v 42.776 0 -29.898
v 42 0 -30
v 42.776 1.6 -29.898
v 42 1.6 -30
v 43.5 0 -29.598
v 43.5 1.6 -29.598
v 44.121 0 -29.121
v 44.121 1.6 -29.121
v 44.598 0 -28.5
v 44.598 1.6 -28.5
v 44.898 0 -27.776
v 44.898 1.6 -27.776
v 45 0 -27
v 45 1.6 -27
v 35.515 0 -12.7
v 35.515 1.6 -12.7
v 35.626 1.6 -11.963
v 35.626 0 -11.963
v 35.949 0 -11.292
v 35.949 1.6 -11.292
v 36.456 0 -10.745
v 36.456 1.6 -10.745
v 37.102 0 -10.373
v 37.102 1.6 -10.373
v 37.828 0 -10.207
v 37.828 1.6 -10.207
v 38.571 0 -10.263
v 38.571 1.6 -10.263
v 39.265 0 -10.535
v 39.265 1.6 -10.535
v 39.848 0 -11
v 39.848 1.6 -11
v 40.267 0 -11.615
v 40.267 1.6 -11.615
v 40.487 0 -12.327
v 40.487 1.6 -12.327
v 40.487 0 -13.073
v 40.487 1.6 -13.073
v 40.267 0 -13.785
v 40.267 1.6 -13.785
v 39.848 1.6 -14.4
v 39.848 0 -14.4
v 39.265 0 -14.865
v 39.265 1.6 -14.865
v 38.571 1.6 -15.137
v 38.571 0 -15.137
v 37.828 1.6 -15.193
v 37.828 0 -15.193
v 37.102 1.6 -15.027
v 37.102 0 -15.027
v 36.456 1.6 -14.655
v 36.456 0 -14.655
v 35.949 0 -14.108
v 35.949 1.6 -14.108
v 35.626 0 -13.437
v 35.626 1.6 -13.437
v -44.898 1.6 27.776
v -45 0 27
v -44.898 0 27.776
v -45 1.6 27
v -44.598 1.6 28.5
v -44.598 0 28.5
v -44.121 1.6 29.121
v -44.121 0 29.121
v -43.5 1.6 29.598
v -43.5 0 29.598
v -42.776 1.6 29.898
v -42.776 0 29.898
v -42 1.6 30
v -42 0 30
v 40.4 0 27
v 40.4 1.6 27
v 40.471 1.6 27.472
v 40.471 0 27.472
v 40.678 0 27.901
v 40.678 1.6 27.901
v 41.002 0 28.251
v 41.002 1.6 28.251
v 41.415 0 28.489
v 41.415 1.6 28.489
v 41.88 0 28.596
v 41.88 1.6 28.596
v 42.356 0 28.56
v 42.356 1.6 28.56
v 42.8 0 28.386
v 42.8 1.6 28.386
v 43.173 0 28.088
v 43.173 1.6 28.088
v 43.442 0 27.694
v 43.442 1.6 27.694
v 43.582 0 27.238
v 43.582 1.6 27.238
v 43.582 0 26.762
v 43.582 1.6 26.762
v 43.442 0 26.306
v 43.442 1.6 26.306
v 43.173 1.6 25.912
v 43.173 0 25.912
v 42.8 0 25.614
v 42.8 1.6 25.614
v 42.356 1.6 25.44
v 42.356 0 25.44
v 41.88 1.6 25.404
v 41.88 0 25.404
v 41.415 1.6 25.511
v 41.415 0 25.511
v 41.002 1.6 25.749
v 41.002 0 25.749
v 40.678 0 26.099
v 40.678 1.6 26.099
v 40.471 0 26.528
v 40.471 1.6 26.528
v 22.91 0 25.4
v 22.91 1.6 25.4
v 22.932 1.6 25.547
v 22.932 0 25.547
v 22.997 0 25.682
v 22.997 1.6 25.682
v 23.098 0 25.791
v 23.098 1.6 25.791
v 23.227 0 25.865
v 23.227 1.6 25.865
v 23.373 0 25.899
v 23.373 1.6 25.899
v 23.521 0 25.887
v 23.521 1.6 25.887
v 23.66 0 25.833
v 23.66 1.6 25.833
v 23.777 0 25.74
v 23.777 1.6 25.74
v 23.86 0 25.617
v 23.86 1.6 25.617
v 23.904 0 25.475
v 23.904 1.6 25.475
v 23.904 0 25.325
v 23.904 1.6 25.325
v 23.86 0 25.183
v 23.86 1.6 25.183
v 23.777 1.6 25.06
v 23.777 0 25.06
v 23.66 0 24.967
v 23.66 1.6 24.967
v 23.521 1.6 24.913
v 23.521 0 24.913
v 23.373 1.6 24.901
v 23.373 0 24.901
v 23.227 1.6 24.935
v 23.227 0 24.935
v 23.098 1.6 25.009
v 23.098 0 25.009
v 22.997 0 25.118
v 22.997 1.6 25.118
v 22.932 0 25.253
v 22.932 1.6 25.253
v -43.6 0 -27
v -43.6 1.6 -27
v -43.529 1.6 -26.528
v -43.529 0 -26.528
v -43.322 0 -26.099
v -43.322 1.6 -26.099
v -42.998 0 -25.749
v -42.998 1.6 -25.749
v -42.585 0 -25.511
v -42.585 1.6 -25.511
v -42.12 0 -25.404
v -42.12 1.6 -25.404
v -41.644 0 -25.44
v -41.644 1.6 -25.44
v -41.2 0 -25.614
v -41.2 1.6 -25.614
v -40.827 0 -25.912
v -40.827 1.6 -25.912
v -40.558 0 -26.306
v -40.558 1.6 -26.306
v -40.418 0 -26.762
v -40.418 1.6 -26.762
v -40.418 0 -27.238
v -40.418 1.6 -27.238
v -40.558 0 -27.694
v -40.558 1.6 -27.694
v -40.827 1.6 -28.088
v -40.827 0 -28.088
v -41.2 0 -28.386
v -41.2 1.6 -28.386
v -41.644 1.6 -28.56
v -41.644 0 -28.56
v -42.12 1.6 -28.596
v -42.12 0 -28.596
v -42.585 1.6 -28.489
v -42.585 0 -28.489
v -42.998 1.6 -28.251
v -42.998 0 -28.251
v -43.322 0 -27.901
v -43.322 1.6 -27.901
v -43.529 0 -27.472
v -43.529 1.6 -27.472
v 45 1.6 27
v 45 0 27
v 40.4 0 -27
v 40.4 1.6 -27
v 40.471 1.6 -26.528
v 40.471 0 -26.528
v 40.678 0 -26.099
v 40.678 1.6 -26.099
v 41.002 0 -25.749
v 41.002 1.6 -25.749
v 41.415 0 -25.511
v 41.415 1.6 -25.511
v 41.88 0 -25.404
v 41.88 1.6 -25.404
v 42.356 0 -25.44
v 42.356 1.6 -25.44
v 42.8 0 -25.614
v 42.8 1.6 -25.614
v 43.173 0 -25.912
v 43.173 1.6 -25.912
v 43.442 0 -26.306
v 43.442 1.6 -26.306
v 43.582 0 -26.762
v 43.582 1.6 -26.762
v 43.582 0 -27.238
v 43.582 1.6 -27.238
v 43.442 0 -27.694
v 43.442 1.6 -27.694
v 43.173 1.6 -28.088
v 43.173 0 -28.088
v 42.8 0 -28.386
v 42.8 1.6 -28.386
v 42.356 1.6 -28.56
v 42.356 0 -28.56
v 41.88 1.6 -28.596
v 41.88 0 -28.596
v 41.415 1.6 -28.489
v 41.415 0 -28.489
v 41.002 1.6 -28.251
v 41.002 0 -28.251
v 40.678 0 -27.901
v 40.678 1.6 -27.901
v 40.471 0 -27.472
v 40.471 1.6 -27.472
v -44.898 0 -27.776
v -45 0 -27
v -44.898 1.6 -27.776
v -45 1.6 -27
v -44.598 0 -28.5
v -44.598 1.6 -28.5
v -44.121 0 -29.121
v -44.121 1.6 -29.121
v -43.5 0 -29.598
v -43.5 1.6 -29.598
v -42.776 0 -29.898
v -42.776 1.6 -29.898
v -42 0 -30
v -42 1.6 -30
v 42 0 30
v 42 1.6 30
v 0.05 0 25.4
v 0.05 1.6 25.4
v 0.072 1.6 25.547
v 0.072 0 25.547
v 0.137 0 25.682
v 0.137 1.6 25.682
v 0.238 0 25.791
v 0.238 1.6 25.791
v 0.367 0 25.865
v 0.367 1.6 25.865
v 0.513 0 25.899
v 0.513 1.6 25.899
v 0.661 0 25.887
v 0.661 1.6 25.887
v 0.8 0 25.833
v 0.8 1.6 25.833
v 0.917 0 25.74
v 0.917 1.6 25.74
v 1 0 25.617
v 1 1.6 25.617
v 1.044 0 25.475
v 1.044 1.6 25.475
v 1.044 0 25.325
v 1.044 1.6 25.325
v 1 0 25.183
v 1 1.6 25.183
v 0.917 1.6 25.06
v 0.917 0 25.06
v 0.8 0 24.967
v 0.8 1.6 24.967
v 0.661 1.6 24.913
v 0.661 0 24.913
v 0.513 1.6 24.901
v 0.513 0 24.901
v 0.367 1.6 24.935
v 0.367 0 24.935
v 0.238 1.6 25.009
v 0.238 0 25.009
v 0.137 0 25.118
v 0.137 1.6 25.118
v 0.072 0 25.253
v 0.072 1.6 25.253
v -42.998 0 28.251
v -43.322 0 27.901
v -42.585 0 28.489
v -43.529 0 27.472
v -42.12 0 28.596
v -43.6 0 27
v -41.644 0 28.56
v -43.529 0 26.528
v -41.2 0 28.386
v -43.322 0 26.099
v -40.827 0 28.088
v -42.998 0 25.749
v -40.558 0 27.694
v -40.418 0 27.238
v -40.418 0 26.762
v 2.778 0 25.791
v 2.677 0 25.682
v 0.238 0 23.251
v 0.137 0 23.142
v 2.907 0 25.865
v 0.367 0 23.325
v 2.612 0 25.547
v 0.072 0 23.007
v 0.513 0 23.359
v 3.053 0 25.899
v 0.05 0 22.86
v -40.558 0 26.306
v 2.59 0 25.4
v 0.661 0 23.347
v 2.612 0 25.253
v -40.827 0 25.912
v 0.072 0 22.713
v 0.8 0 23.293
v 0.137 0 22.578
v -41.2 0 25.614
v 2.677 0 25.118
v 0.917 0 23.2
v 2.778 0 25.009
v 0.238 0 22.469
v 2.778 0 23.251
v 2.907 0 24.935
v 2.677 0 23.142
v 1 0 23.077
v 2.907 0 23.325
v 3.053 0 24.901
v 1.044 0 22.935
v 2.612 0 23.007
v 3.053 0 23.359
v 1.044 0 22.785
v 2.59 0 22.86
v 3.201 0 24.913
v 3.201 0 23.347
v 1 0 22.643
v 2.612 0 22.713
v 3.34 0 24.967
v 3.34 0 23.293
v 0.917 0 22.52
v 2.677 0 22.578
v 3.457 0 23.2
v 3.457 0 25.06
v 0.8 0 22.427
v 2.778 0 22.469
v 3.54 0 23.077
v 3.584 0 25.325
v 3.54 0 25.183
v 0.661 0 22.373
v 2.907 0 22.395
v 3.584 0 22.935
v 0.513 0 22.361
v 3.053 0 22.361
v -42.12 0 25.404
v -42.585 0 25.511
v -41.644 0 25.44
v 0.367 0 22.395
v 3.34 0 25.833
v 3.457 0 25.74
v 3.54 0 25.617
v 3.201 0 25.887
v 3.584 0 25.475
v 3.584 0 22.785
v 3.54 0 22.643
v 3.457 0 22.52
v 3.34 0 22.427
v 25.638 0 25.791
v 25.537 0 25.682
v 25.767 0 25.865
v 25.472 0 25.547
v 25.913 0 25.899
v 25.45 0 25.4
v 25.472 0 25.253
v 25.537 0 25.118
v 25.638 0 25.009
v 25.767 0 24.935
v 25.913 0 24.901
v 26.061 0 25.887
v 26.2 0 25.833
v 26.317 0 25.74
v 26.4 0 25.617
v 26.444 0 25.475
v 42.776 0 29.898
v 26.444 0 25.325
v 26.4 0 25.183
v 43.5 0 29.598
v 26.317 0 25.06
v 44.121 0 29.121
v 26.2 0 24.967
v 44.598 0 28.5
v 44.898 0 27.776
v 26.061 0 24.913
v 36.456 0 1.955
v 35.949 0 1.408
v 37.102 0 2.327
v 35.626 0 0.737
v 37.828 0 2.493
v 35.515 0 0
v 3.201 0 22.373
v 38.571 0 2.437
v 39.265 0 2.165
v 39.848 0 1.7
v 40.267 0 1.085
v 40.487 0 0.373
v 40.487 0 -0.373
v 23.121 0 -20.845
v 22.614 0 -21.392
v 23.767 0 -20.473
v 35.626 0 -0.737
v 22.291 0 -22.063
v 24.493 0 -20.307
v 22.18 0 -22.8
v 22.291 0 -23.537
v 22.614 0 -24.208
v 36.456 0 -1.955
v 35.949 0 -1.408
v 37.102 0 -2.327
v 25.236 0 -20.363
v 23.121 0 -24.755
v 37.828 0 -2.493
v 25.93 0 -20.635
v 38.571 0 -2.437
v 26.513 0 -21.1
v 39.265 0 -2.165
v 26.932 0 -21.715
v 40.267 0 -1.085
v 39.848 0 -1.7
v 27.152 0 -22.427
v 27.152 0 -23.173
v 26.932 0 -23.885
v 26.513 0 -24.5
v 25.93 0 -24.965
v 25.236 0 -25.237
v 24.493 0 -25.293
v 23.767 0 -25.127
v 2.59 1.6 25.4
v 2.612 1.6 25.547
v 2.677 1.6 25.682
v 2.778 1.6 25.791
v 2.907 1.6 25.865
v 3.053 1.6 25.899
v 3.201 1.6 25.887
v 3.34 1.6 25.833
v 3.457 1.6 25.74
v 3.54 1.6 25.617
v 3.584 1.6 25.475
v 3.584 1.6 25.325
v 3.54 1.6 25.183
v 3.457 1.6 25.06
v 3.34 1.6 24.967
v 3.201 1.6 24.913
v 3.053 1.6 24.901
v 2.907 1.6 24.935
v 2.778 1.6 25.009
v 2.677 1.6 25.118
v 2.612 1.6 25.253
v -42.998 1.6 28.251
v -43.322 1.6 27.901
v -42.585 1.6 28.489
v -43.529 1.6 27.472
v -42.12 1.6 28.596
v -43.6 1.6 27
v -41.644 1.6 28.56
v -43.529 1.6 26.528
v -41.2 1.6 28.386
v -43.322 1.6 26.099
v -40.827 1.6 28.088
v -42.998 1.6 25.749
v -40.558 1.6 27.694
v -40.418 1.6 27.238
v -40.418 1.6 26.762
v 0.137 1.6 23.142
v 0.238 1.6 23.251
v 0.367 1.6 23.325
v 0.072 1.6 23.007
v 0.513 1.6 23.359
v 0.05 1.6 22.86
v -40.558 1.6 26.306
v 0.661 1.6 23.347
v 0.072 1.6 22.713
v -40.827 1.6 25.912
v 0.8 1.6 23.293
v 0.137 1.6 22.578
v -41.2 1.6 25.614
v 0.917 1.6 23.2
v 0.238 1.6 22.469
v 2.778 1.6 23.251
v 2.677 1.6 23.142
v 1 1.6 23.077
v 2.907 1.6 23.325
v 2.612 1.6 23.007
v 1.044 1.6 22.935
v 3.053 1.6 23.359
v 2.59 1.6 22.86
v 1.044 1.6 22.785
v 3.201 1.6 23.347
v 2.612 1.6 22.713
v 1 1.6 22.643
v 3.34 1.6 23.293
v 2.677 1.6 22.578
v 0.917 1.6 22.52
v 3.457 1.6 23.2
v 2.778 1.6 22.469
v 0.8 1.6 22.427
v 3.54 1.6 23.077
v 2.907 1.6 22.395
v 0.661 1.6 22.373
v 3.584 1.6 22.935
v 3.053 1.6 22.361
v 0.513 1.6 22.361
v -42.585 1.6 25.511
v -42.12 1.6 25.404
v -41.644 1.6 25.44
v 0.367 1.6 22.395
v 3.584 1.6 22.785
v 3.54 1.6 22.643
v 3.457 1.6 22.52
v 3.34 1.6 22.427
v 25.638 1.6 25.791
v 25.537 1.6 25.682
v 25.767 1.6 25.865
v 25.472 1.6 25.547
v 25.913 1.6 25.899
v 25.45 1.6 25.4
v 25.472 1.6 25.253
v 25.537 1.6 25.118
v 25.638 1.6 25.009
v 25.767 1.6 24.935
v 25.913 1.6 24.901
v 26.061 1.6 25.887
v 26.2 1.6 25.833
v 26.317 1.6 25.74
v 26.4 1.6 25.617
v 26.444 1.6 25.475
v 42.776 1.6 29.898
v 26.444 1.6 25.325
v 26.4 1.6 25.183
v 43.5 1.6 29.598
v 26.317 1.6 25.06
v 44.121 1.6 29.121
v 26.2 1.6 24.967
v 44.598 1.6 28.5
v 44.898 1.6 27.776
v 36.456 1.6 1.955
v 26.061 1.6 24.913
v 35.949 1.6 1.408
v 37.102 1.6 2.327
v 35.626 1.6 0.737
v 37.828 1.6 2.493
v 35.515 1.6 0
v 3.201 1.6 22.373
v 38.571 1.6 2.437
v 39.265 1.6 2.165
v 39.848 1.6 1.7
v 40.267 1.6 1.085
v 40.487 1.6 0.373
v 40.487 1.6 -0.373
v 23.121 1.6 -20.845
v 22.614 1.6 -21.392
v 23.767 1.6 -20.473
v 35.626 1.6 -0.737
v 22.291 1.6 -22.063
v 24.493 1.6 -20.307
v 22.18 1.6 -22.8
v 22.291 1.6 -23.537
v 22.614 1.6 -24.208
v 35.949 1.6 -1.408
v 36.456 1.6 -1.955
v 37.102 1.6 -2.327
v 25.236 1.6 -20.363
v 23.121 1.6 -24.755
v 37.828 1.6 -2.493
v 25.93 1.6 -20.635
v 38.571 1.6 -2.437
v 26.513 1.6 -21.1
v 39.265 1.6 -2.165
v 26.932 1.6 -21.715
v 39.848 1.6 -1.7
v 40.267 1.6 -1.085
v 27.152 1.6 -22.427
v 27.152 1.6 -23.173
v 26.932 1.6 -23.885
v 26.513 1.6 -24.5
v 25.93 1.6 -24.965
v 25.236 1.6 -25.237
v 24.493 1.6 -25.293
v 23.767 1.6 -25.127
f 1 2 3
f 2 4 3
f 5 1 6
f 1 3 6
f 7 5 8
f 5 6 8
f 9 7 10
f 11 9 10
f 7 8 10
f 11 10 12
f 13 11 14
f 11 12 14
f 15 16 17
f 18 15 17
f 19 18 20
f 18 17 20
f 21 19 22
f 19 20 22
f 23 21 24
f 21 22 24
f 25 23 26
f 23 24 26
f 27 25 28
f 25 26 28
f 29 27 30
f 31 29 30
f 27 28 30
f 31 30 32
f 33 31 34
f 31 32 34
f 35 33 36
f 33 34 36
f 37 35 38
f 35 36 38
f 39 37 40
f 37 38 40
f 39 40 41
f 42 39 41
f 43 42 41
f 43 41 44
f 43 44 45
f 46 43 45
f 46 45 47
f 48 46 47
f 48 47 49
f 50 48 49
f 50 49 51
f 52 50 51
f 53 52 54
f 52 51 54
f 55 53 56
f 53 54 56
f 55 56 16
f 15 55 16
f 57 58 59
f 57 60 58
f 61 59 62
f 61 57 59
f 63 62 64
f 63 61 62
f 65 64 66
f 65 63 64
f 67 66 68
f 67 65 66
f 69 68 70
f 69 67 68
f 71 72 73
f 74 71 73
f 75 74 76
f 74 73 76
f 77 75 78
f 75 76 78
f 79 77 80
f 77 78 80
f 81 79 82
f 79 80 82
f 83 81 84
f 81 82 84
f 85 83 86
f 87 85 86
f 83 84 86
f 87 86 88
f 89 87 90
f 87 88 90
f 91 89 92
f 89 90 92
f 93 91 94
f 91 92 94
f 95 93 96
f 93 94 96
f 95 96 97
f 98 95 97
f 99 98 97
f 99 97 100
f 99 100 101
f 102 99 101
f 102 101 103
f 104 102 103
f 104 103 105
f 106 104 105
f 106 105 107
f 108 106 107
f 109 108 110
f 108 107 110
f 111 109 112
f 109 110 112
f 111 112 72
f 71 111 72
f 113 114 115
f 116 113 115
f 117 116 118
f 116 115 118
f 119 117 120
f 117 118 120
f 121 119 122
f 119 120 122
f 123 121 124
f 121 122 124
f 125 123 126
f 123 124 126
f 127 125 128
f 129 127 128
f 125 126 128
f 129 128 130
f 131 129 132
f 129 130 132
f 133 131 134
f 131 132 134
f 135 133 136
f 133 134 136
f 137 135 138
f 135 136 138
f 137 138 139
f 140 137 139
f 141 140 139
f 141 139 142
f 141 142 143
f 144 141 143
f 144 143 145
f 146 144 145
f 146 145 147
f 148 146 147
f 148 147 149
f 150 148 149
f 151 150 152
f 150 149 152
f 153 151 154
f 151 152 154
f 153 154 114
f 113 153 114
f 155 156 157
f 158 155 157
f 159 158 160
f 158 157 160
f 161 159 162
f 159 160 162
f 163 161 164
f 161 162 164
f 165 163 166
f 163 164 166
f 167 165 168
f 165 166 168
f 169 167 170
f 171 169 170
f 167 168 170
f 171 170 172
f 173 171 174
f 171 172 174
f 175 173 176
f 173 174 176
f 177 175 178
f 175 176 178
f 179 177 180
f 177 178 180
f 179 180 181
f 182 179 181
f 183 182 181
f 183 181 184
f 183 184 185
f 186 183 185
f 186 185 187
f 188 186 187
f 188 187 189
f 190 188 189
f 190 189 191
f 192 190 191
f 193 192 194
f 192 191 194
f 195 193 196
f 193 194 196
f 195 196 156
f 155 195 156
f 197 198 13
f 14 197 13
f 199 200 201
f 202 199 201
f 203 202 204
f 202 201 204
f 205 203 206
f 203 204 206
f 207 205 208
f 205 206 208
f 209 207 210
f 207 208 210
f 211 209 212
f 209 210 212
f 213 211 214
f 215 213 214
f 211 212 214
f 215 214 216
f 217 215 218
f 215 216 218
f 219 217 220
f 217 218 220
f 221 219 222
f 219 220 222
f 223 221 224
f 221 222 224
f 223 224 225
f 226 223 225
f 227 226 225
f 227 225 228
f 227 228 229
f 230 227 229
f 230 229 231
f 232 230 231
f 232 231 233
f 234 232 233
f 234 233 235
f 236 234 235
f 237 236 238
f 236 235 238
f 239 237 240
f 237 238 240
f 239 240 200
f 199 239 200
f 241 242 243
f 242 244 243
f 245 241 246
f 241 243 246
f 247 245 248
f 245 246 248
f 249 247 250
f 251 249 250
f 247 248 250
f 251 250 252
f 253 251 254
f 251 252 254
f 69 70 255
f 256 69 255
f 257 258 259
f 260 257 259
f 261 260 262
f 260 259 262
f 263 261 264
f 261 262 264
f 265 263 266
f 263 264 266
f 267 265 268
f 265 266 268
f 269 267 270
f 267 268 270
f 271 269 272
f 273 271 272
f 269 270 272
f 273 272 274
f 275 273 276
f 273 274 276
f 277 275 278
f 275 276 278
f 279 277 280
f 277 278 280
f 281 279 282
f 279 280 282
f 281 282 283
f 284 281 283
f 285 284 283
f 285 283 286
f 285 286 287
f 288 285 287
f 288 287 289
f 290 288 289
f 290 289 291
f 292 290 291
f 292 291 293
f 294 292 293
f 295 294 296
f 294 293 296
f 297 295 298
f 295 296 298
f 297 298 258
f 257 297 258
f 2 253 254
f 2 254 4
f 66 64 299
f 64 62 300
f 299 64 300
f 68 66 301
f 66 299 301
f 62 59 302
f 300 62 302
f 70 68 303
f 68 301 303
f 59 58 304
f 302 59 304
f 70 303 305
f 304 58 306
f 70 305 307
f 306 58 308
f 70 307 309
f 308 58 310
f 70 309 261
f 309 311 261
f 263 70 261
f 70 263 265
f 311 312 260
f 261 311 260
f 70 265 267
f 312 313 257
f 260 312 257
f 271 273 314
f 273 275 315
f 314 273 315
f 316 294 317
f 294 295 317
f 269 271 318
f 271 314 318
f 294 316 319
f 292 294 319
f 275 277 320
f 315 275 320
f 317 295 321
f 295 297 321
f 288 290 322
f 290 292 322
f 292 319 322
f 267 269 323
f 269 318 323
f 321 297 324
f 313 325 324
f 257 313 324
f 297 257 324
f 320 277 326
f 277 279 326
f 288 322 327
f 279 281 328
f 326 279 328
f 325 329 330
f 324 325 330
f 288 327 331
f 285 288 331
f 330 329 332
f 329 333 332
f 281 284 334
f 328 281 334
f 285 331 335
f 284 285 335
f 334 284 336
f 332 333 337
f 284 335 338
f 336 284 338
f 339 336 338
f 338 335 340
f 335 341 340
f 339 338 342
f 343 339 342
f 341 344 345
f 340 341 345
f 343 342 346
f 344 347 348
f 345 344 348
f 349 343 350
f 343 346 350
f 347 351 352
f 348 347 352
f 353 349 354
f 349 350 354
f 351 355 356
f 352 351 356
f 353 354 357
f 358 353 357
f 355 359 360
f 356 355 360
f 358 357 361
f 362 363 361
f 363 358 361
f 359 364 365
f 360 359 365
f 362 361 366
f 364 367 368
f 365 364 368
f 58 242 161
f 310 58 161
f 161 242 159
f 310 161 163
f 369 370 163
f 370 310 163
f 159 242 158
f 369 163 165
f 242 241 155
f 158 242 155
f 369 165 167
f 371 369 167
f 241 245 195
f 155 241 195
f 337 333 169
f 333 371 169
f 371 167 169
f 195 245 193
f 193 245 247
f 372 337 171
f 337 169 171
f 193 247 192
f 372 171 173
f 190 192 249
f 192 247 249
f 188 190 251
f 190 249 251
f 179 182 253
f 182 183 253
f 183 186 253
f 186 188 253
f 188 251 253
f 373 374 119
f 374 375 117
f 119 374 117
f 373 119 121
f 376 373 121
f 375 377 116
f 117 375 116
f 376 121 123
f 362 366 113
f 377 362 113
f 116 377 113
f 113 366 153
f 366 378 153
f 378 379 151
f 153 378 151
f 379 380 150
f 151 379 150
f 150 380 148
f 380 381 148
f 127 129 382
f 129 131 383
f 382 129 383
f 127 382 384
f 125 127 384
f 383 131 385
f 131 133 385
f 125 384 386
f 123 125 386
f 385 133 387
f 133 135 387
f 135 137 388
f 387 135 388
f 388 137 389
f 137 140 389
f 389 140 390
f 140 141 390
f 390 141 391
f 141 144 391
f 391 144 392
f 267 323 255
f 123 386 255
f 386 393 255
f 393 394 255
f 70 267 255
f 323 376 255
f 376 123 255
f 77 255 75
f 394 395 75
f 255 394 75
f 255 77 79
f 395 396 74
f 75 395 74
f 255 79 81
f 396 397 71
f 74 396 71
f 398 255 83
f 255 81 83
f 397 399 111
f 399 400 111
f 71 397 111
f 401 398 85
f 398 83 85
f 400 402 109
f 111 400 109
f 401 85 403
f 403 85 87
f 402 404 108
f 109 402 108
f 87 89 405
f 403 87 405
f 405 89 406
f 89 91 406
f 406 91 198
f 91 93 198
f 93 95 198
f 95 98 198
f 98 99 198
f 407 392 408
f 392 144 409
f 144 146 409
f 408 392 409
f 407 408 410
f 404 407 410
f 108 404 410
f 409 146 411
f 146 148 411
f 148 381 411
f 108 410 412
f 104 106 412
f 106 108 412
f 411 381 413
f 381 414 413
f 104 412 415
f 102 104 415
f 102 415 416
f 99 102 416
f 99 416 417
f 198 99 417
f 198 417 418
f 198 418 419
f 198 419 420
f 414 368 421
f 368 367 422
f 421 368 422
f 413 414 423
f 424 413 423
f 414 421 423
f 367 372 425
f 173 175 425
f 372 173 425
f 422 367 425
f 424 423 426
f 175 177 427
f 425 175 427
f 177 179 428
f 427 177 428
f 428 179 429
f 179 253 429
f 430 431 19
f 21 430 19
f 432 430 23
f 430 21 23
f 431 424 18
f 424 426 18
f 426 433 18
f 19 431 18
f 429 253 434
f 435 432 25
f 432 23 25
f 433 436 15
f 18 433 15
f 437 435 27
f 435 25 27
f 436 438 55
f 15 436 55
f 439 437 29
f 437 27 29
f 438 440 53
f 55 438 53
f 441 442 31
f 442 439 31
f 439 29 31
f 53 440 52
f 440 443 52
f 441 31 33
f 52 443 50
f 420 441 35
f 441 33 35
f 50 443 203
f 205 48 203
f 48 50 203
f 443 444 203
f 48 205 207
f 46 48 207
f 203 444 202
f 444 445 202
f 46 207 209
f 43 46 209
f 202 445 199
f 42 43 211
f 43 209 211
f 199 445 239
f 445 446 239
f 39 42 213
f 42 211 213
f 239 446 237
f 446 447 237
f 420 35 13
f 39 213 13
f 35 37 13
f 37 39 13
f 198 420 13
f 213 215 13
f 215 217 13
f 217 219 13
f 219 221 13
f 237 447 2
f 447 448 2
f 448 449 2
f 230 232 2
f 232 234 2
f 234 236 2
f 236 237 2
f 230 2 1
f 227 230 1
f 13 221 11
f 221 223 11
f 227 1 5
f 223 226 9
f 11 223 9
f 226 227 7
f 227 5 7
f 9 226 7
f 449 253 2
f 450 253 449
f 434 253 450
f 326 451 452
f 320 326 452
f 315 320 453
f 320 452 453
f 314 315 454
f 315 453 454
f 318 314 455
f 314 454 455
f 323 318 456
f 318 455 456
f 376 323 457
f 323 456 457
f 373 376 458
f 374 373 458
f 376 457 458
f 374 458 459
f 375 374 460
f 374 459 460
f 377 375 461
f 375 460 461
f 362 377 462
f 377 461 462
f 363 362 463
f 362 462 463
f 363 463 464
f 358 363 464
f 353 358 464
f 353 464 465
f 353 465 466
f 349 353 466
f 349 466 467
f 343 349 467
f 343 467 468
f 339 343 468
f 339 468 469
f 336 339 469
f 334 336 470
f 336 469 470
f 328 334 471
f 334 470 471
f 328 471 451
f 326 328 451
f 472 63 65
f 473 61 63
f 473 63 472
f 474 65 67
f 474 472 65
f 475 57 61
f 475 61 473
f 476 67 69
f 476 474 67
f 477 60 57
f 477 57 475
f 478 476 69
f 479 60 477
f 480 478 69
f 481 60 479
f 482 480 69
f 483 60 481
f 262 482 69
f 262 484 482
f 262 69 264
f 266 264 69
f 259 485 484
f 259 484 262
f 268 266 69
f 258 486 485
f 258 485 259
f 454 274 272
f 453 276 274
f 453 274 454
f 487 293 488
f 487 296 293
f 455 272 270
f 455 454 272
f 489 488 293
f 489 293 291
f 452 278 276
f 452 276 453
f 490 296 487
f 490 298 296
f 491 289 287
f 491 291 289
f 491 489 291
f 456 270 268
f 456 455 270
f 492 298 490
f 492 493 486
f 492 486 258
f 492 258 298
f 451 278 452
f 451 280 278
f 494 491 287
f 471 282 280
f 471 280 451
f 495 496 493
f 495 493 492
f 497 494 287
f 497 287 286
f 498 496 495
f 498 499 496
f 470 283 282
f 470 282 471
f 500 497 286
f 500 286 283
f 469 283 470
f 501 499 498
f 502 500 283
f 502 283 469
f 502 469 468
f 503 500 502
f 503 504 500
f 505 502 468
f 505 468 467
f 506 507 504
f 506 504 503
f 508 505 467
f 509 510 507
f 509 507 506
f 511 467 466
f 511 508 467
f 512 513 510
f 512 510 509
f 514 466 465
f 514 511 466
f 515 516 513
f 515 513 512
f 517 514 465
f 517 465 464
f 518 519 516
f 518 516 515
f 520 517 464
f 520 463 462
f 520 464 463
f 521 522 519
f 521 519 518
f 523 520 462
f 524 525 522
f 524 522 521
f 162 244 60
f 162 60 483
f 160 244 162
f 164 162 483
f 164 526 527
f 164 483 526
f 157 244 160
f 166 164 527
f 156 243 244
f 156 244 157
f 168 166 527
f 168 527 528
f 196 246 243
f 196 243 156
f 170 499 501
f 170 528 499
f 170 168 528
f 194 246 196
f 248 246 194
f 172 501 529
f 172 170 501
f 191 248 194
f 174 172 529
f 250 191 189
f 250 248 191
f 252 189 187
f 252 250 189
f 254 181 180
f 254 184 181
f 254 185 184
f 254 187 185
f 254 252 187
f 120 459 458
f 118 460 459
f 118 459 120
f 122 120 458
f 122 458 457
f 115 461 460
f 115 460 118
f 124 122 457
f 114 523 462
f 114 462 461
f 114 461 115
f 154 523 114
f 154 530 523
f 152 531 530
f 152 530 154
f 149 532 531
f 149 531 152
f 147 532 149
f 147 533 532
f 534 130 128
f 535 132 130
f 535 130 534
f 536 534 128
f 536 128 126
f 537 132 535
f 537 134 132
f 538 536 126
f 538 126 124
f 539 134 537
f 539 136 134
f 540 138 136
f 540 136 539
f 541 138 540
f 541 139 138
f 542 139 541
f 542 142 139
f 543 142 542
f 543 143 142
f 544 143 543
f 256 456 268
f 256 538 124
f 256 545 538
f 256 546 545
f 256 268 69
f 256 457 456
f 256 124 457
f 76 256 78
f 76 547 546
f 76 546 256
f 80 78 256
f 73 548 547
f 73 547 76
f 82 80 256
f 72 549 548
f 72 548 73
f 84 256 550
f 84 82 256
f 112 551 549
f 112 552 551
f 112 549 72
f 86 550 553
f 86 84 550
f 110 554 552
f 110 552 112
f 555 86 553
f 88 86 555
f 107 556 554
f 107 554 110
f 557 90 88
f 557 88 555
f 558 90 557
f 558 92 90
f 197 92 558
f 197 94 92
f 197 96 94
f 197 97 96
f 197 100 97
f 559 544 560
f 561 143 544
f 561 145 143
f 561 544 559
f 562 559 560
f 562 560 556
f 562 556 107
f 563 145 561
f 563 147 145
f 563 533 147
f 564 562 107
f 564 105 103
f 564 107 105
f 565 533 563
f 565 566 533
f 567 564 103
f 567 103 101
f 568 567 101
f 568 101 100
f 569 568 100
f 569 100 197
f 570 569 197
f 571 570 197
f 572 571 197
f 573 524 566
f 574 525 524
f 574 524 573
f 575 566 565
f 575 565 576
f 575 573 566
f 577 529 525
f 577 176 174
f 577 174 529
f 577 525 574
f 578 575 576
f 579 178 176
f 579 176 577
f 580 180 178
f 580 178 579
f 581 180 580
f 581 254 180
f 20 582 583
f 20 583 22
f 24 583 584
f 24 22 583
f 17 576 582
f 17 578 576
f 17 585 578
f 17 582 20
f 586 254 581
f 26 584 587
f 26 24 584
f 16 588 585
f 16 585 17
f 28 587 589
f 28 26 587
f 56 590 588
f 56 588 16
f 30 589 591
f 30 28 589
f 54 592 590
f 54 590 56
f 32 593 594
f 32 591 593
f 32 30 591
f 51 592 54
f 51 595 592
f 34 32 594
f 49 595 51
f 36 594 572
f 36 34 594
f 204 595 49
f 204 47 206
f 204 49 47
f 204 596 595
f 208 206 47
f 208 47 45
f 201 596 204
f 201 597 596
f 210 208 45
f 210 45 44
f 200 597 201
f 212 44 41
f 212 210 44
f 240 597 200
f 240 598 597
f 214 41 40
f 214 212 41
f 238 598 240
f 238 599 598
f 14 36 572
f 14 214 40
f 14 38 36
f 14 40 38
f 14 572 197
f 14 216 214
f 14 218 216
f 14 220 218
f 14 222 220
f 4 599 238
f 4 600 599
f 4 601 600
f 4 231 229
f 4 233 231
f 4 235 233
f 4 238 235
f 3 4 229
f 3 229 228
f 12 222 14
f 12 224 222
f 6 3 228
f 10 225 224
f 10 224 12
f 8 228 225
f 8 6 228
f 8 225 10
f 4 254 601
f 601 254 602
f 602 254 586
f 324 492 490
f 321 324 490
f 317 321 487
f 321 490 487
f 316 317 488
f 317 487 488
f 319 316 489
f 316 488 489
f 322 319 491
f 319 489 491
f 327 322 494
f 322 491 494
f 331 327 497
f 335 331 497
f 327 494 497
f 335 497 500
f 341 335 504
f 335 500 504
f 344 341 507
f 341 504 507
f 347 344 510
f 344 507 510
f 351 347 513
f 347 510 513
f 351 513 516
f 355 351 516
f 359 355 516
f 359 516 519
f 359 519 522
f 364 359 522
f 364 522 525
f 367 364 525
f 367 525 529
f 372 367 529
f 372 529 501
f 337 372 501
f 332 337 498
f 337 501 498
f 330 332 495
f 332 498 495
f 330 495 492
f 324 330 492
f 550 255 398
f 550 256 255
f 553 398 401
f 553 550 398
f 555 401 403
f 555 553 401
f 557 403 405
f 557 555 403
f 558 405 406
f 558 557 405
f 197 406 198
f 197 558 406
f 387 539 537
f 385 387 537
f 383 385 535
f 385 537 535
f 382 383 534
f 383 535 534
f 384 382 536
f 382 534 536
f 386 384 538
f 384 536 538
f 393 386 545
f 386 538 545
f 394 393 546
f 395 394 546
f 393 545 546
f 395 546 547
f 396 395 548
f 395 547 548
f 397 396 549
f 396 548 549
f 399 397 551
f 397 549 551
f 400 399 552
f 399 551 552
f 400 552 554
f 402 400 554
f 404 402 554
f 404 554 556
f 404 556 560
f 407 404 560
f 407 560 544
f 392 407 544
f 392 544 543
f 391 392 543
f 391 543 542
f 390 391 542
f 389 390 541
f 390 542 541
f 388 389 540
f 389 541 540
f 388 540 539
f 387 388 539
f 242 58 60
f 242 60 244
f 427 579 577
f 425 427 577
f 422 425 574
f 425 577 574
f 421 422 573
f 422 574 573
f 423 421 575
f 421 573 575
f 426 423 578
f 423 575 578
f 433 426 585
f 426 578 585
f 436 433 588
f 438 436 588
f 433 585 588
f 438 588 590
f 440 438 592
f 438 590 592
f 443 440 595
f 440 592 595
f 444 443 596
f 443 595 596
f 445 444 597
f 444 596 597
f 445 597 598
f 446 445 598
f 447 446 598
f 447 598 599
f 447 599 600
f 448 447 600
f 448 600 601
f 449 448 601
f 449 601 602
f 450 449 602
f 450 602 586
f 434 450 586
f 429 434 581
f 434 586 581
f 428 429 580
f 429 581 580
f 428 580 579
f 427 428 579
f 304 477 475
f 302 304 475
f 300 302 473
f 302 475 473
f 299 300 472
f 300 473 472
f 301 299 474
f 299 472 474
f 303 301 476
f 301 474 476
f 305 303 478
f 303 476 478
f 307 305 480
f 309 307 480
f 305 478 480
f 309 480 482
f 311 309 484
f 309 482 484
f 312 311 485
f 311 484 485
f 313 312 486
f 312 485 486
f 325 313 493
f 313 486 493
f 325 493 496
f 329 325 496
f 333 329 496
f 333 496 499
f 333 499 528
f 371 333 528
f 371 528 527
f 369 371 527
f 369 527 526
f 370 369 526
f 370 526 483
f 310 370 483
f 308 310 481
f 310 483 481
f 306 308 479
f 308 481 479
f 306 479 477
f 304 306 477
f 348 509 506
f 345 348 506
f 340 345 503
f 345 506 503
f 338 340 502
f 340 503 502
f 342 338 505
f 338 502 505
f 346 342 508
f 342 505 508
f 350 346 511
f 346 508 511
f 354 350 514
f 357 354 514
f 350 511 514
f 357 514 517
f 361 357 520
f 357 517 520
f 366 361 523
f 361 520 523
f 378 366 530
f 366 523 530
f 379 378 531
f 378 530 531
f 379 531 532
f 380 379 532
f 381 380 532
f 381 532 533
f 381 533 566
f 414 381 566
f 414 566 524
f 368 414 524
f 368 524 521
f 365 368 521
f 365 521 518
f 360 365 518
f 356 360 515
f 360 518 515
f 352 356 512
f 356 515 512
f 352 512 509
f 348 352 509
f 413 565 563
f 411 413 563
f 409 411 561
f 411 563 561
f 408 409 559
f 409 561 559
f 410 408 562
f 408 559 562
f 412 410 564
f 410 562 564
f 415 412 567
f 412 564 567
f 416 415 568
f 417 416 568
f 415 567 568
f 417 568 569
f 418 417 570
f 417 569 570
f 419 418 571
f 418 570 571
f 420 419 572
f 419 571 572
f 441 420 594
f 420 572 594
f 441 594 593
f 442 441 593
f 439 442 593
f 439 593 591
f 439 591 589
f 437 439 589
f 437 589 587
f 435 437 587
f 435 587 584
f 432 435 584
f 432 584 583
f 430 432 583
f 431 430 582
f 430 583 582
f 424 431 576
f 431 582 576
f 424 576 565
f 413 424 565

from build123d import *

# Parameters (mm, degrees)
SKETCH1_W           = 90
SKETCH1_H           = 60
BOSS_EXTRUDE1_DEPTH = 1.6
SKETCH2_R           = 1.6
CUT_EXTRUDE1_DEPTH  = 1.6
FILLET1_R           = 3
SKETCH3_R           = 0.5
SKETCH3_R_2         = 2.5
CUT_EXTRUDE2_DEPTH  = 1.6


with BuildPart() as part:
    # Sketch1 → Boss-Extrude1 (new body)
    with BuildSketch(Plane(origin=(0, 0, 0), x_dir=(1, 0, 0), z_dir=(0, 1, 0))):
        Rectangle(SKETCH1_W, SKETCH1_H)
    extrude(amount=BOSS_EXTRUDE1_DEPTH)

    # Sketch2 → Cut-Extrude1 (cut)
    with BuildSketch(Plane(origin=(0, 1.6, 0), x_dir=(-1, 0, 0), z_dir=(0, 1, 0))):
        with Locations((42, -27)):
            Circle(SKETCH2_R)
        with Locations((42, 27)):
            Circle(SKETCH2_R)
        with Locations((-42, 27)):
            Circle(SKETCH2_R)
        with Locations((-42, -27)):
            Circle(SKETCH2_R)
    extrude(amount=-CUT_EXTRUDE1_DEPTH, mode=Mode.SUBTRACT)

    # Fillet1
    fillet1_edges = [part.edges().sort_by_distance(p)[0] for p in [
        (-45, 0.8, -30),
        (45, 0.8, -30),
        (45, 0.8, 30),
        (-45, 0.8, 30),
    ]]
    fillet(fillet1_edges, radius=FILLET1_R)

    # Sketch3 → Cut-Extrude2 (cut)
    with BuildSketch(Plane(origin=(0, 1.6, 0), x_dir=(-1, 0, 0), z_dir=(0, 1, 0))):
        with Locations((-0.55, 25.4)):
            Circle(SKETCH3_R)
        with Locations((-0.55, 22.86)):
            Circle(SKETCH3_R)
        with Locations((-3.09, 25.4)):
            Circle(SKETCH3_R)
        with Locations((-3.09, 22.86)):
            Circle(SKETCH3_R)
        with Locations((-23.41, 25.4)):
            Circle(SKETCH3_R)
        with Locations((-25.95, 25.4)):
            Circle(SKETCH3_R)
        with Locations((-38.015, 0)):
            Circle(SKETCH3_R_2)
        with Locations((-38.015, -12.7)):
            Circle(SKETCH3_R_2)
        with Locations((-24.68, -22.8)):
            Circle(SKETCH3_R_2)
    extrude(amount=-CUT_EXTRUDE2_DEPTH, mode=Mode.SUBTRACT)


solid = part.part
